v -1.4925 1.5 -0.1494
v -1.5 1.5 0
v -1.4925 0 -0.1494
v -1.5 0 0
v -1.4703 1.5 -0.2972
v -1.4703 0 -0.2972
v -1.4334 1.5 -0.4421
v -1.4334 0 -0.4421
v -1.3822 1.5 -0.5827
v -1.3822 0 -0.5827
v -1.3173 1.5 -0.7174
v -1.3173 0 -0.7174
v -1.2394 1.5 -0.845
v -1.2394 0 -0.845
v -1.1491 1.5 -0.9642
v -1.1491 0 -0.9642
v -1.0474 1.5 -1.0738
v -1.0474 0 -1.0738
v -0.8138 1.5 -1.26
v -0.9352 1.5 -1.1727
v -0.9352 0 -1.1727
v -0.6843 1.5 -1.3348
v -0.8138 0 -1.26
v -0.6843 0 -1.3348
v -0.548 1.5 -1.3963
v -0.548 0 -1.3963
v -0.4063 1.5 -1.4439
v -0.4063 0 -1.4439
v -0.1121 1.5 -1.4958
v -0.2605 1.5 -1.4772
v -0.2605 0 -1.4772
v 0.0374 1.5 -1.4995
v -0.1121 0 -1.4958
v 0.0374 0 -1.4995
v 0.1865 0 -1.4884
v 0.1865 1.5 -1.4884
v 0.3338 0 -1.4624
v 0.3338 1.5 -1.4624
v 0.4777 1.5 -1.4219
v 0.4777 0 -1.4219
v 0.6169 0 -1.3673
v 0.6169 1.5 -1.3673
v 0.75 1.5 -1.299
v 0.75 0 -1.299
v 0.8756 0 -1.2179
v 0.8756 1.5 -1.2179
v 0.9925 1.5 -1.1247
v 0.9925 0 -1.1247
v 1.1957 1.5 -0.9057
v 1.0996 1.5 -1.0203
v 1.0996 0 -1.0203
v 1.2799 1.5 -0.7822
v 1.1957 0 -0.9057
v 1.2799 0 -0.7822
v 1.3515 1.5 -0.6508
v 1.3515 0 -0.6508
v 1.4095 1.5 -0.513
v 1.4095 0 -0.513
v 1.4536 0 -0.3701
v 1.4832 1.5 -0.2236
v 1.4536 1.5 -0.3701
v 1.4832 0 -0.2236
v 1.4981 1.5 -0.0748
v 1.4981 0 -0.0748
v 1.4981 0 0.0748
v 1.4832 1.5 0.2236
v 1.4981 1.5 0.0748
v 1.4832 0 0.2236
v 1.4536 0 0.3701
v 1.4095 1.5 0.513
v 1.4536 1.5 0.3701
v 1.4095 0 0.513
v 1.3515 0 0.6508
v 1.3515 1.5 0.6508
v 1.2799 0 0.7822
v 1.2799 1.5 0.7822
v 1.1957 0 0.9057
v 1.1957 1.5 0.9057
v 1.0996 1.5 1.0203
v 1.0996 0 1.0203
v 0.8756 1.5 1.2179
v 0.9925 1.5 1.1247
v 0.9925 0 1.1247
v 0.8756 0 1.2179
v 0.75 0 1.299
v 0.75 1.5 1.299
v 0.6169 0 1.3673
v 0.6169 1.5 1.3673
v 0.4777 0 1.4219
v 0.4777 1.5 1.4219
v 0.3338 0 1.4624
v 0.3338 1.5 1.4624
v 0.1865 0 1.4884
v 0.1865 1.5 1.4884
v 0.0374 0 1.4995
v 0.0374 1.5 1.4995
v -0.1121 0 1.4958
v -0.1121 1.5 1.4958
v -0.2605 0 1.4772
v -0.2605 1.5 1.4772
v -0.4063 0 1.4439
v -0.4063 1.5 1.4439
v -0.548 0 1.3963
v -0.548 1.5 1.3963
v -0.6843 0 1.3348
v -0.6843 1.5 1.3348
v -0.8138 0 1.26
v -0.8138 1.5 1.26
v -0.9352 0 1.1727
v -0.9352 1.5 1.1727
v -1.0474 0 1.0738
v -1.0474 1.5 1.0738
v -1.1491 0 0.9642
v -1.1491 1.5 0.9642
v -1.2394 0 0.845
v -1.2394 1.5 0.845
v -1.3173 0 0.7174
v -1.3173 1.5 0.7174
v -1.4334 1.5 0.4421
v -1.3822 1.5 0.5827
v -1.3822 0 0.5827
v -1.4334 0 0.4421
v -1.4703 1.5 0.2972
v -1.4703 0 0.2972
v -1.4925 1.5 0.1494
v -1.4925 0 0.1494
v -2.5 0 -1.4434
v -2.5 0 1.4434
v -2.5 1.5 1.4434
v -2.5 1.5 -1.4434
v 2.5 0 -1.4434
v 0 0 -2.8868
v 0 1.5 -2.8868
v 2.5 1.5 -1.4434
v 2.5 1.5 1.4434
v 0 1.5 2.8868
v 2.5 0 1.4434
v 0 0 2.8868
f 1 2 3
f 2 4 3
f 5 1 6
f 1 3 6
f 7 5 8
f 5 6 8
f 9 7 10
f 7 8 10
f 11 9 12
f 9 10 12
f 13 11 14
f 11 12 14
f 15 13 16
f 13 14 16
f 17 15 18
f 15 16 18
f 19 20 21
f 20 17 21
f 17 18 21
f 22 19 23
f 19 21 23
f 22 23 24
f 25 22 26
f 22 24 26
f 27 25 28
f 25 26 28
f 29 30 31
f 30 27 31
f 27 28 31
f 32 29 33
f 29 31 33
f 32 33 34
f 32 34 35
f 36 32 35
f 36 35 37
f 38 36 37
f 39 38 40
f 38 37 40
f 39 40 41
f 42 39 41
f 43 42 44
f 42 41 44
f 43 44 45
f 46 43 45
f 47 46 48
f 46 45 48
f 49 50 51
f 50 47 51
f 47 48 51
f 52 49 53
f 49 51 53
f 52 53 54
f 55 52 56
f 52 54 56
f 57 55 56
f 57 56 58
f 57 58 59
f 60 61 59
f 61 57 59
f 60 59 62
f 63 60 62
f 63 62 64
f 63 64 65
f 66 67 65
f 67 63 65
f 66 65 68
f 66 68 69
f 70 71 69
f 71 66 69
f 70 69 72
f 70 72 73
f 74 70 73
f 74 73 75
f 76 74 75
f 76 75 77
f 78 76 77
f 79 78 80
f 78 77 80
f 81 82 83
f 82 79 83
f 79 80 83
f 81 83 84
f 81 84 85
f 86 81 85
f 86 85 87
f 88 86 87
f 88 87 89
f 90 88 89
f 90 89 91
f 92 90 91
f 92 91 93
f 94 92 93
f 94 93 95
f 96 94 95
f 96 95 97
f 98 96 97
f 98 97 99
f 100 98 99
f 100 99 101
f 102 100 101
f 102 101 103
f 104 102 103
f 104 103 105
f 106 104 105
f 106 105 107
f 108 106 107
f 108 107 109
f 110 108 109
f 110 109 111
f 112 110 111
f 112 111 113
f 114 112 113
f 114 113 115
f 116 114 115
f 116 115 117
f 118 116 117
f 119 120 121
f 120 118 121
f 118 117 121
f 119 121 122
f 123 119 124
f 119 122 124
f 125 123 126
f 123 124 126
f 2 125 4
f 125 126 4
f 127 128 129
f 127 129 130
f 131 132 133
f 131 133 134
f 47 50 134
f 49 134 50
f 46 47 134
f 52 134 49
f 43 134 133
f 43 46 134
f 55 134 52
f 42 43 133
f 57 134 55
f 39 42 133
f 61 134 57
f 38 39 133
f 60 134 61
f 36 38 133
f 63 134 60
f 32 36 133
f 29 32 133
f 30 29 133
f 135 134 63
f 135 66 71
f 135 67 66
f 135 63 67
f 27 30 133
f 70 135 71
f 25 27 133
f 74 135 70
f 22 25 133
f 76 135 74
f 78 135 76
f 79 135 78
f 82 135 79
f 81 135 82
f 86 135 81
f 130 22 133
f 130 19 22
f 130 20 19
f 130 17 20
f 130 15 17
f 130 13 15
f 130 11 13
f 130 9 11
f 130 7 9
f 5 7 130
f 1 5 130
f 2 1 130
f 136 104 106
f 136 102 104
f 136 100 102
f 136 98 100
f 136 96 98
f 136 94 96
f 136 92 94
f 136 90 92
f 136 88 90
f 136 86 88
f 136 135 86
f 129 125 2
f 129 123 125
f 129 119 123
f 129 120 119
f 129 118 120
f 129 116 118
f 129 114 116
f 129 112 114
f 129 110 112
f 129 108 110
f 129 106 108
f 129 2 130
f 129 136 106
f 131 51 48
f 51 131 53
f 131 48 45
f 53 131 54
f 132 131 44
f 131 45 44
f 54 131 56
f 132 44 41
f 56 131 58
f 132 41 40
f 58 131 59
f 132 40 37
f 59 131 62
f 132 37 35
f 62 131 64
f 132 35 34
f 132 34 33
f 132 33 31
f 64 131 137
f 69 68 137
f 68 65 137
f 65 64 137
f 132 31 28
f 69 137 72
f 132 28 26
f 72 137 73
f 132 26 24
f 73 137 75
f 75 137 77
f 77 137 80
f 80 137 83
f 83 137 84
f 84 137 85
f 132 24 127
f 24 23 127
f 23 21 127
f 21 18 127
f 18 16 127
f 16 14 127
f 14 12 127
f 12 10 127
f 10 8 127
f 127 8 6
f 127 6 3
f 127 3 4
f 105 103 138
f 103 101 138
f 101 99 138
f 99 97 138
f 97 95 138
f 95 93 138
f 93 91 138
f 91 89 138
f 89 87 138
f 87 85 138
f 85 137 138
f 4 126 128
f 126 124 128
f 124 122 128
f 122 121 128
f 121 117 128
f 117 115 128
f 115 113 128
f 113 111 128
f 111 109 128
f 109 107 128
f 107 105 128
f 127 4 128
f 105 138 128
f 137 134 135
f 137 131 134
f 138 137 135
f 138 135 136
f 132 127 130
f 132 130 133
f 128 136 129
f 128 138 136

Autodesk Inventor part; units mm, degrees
ref_plane "YZ Plane" through (0, 0, 0) normal (1, 0, 0) x (0, 1, 0)
ref_plane "XZ Plane" through (0, 0, 0) normal (0, 1, 0) x (-1, 0, 0)
ref_plane "XY Plane" through (0, 0, 0) normal (0, 0, 1) x (1, 0, 0)
sketch "Sketch1" plane through (0, 0, 0) normal (0, 1, 0) x (-1, 0, 0)
  circle A0 centre (0, 0) radius 1.5
  line L0 (0, -2.8868) -> (-2.5, -1.4434)
  line L1 (-2.5, -1.4434) -> (-2.5, 1.4434)
  line L2 (-2.5, 1.4434) -> (0, 2.8868)
  line L3 (0, 2.8868) -> (2.5, 1.4434)
  line L4 (2.5, 1.4434) -> (2.5, -1.4434)
  line L5 (2.5, -1.4434) -> (0, -2.8868)
  dimension "d0" = 3
  dimension "d1" = 5
extrude "Extrusion1" add sketch "Sketch1" along normal blind 1.5
thread "Thread1" size "M3x0.5" class "6H" standard "ANSI Metric M Profile" full length
properties part number "M3 Nut Steel" material "Steel"
